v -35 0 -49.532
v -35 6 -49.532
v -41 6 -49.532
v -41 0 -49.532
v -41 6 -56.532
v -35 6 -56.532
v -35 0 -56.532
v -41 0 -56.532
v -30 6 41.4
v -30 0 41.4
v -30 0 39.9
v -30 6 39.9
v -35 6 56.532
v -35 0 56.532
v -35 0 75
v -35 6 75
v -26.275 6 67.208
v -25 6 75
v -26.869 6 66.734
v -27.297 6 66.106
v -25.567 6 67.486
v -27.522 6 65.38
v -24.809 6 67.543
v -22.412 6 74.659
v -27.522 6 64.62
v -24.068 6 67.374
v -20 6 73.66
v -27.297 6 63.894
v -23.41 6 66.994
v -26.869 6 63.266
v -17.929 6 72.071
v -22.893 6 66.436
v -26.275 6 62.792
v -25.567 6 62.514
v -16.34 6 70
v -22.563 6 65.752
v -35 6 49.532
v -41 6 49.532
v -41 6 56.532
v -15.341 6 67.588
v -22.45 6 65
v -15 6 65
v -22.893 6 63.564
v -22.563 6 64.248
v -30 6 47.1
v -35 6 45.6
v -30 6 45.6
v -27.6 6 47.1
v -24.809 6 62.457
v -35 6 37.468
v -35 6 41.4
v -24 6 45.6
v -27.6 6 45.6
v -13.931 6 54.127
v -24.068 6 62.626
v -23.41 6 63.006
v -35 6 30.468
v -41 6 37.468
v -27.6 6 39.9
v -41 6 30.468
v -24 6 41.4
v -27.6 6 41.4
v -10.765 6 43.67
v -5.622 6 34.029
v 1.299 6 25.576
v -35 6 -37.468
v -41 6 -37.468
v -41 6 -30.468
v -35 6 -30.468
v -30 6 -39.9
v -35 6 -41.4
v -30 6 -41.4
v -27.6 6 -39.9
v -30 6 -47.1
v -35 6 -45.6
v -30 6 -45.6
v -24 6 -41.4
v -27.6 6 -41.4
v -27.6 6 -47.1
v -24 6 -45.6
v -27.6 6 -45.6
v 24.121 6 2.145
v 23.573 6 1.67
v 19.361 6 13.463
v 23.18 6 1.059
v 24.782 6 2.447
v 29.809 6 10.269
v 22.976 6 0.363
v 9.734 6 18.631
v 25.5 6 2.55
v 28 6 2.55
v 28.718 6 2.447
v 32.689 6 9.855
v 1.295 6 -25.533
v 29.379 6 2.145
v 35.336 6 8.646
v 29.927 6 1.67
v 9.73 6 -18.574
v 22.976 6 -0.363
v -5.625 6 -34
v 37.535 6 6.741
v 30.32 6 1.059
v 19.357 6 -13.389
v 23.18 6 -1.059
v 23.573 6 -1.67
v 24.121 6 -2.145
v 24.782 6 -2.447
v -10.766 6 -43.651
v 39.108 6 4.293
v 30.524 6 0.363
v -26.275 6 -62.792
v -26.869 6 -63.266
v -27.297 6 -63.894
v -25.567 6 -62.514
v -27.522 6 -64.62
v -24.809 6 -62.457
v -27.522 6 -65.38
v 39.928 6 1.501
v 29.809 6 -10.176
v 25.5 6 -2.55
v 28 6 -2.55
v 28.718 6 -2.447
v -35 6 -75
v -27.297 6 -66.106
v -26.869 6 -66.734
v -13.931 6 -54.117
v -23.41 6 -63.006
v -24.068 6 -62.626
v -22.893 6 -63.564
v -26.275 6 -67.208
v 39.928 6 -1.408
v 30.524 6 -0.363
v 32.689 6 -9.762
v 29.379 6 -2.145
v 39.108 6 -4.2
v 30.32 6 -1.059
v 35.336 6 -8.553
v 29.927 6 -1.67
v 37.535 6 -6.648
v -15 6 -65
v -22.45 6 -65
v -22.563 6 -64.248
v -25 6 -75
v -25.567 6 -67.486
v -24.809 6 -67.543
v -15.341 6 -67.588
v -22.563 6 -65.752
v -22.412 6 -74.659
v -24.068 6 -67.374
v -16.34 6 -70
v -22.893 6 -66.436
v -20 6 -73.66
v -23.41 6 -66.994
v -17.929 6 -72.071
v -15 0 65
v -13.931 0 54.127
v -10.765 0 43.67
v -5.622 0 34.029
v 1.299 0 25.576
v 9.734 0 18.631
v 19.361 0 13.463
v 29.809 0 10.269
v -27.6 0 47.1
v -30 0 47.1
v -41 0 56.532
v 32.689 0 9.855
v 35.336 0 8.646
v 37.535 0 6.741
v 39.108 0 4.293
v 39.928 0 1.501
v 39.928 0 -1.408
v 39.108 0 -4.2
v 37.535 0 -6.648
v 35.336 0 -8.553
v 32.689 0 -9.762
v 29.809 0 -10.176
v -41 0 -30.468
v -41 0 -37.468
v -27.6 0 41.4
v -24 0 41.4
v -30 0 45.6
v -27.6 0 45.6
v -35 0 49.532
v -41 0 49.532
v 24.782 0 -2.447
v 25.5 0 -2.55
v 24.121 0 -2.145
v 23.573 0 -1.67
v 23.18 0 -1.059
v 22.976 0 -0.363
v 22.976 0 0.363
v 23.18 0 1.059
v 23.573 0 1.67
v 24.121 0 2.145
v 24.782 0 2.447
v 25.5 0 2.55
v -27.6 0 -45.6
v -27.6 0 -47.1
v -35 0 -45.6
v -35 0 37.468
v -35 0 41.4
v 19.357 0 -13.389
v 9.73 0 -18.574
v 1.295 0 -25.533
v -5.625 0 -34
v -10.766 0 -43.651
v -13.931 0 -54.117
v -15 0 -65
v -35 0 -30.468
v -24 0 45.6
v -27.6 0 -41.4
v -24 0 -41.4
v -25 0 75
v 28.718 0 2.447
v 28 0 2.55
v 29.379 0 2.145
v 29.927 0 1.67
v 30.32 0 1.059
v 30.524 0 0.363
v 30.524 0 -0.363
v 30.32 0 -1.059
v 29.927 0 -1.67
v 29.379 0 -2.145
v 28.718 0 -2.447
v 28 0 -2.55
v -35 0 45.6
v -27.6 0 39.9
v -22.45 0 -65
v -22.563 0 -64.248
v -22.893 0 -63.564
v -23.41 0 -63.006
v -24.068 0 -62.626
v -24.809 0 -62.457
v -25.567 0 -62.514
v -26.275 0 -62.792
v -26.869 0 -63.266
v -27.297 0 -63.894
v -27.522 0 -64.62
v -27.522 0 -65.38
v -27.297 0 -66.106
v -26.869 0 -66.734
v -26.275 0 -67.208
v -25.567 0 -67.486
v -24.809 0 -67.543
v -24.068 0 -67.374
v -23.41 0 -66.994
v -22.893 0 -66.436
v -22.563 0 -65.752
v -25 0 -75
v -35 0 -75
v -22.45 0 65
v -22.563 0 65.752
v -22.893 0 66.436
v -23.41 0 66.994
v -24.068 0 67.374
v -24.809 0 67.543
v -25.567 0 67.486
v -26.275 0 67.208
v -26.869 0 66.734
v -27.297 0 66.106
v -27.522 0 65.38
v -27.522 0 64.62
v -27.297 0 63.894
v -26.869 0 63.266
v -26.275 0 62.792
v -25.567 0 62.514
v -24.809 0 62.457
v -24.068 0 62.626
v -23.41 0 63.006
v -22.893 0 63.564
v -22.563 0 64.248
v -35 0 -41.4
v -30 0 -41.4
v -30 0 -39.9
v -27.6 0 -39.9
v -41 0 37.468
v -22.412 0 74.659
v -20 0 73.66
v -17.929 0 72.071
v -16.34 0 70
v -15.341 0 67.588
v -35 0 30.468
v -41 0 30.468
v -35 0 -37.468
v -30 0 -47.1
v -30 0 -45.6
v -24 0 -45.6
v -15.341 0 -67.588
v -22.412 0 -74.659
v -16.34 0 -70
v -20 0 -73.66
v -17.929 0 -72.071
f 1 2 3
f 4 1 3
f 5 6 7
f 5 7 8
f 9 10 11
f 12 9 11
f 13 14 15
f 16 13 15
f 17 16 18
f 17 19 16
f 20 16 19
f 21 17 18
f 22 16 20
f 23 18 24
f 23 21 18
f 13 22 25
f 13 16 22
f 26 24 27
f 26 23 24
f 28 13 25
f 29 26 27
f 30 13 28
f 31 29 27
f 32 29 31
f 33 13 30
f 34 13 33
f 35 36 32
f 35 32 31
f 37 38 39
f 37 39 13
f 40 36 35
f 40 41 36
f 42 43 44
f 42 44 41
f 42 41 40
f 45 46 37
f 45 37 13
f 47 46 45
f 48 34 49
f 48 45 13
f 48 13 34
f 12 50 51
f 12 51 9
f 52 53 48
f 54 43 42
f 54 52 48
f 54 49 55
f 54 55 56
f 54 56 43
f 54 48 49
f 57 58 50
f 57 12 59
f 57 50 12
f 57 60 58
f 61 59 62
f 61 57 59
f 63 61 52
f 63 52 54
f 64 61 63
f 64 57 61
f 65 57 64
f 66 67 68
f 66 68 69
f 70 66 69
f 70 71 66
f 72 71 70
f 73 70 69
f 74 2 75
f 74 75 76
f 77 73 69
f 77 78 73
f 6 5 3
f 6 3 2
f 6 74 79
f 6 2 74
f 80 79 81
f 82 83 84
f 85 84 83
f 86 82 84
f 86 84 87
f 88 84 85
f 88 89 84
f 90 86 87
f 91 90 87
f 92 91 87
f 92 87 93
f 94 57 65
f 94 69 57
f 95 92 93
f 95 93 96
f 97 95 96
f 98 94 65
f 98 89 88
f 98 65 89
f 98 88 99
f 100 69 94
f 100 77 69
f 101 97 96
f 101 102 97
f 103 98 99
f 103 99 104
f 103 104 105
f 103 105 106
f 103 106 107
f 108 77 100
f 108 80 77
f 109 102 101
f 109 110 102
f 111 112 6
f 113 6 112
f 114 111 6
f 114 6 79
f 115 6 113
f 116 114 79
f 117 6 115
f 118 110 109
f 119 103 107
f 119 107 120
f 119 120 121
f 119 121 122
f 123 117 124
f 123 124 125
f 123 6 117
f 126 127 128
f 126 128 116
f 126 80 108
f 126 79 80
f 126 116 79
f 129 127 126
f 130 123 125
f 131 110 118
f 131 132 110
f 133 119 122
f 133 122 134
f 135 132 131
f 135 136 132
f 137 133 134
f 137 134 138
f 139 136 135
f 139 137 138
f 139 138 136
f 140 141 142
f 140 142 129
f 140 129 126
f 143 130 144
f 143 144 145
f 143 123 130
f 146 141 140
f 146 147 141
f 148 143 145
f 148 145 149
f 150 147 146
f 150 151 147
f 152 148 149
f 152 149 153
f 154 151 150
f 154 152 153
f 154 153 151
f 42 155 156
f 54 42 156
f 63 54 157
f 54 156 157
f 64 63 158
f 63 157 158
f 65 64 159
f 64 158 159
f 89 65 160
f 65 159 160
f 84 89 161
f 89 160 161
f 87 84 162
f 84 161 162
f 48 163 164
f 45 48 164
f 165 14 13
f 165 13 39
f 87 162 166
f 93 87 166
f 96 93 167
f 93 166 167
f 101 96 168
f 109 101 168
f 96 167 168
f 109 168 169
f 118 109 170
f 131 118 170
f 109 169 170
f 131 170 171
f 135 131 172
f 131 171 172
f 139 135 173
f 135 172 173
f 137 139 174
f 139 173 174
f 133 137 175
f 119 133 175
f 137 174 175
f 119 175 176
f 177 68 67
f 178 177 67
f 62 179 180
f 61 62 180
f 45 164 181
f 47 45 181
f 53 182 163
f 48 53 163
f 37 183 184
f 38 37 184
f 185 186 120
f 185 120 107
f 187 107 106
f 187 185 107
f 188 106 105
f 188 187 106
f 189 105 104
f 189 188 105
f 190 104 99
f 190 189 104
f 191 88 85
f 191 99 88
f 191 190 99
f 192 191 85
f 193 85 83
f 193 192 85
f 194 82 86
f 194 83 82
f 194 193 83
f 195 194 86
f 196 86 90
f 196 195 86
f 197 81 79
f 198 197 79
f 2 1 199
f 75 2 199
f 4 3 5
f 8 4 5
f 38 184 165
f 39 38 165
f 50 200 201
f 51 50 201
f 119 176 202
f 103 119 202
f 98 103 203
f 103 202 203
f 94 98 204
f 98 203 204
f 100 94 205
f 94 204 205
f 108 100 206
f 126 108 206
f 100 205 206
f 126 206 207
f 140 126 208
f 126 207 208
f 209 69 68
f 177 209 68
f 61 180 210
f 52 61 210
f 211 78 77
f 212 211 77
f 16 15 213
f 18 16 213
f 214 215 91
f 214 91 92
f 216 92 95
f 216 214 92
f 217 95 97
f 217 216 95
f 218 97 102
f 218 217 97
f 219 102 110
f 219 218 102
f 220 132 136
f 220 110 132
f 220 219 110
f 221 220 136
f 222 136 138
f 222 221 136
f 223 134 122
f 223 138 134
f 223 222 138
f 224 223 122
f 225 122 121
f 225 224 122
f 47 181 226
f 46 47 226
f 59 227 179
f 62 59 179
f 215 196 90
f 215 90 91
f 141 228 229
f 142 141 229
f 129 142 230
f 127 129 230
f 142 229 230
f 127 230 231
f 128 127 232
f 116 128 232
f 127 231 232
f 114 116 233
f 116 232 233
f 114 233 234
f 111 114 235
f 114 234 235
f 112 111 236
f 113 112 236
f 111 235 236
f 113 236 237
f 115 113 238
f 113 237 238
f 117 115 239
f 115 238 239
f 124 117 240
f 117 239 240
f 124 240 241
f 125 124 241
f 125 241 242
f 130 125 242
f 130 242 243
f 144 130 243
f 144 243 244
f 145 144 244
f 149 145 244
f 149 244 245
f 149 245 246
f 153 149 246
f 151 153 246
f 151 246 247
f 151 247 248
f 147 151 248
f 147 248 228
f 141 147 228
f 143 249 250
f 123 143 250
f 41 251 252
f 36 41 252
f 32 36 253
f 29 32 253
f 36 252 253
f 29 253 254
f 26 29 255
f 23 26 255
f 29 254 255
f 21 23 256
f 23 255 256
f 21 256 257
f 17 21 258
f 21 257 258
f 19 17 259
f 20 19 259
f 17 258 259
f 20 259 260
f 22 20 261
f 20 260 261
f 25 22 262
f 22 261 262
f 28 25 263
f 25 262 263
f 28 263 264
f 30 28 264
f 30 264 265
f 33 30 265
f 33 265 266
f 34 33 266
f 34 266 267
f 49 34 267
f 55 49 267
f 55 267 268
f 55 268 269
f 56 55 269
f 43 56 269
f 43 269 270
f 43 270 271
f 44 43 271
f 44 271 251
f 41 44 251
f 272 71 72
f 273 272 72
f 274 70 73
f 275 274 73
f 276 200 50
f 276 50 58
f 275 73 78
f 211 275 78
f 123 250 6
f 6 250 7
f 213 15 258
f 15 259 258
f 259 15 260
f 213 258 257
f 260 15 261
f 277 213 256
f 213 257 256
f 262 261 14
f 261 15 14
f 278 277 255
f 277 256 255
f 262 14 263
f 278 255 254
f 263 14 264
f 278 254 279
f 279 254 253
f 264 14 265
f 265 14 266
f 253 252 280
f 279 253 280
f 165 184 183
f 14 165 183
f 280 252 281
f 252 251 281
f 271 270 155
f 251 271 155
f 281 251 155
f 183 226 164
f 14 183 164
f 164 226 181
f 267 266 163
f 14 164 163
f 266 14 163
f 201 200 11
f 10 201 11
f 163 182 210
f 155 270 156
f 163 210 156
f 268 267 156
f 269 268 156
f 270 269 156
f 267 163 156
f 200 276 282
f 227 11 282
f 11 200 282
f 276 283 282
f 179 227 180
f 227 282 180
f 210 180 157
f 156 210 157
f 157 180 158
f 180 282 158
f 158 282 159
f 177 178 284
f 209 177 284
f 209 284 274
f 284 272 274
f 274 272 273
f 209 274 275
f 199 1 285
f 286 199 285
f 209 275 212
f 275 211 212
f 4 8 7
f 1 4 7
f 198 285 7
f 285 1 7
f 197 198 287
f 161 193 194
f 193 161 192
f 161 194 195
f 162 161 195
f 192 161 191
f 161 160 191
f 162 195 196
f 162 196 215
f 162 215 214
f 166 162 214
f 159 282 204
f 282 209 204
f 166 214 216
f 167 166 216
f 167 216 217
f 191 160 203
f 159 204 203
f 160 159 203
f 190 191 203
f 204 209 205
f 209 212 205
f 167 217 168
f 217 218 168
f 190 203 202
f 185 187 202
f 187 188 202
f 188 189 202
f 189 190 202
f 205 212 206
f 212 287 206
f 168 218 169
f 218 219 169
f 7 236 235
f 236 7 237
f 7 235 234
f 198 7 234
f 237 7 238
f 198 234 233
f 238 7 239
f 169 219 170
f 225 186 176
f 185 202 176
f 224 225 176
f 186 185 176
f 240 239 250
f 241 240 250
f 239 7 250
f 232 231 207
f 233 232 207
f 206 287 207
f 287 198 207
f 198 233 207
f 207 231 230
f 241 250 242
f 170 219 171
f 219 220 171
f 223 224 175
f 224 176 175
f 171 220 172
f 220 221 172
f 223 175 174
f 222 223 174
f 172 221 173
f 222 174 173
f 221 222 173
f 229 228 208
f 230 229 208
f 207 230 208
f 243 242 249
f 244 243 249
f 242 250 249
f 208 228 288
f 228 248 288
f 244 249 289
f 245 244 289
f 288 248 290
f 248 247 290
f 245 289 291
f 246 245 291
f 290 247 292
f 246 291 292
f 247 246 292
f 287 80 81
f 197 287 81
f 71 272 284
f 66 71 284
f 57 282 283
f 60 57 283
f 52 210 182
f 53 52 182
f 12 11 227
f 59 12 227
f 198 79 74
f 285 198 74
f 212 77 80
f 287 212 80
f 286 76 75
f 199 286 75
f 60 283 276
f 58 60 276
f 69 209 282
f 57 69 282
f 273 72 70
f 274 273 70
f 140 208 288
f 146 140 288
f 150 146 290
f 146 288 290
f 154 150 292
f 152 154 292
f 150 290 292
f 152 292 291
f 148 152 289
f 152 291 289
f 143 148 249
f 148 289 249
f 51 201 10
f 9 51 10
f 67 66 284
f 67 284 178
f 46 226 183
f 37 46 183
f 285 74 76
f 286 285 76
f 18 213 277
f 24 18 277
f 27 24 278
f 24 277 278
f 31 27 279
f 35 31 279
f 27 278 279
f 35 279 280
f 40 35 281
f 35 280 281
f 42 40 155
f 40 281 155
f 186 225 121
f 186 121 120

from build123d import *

# Parameters (mm, degrees)
EXTRUDE_1_DEPTH      = 6
SKETCH_2_R           = 2.55
CUT_EXTRUDE_1_DEPTH  = 7
SKETCH_21_W          = 7
SKETCH_21_H          = 6
EXTRUDE_2_DEPTH      = 6
CUT_EXTRUDE_11_DEPTH = 7
SKETCH_22_W          = 7
SKETCH_22_H          = 6
EXTRUDE_21_DEPTH     = 6
SKETCH_24_W          = 7
SKETCH_24_H          = 6
EXTRUDE_23_DEPTH     = 6
CUT_EXTRUDE_14_DEPTH = 7
SKETCH_25_W          = 7
SKETCH_25_H          = 6
EXTRUDE_24_DEPTH     = 6
SKETCH_26_W          = 7
SKETCH_26_H          = 6
EXTRUDE_25_DEPTH     = 6
SKETCH_27_W          = 7
SKETCH_27_H          = 6
EXTRUDE_26_DEPTH     = 6
SKETCH_28_W          = 7
SKETCH_28_H          = 6
EXTRUDE_27_DEPTH     = 6
SKETCH_29_W          = 7
SKETCH_29_H          = 6
EXTRUDE_28_DEPTH     = 6


with BuildPart() as part:
    # Эскиз1 → Бобышка-Вытянуть1 (new body)
    with BuildSketch(Plane(origin=(0, 0, 0), x_dir=(1, 0, 0), z_dir=(0, 1, 0))):
        with BuildLine():
            Line((-35, -65), (-35, -75))
            Line((-35, -75), (-25, -75))
            ThreePointArc((-25, -75), (-17.928932188, -72.071067812), (-15, -65))
            ThreePointArc((-15, -65), (-2.368853025, -29.632779179), (29.809139443, -10.26881824))
            ThreePointArc((29.809139443, -10.26881824), (40.031565804, -0.046391879), (29.809139443, 10.176034483))
            ThreePointArc((29.809139443, 10.176034483), (-2.372594749, 29.596870998), (-15, 65))
            ThreePointArc((-15, 65), (-17.928932188, 72.071067812), (-25, 75))
            Line((-25, 75), (-35, 75))
            Line((-35, 75), (-35, 65))
            Line((-35, 65), (-35, -65))
        make_face()
    extrude(amount=EXTRUDE_1_DEPTH)

    # Эскиз2 → Вырез-Вытянуть1 (cut, through all)
    with BuildSketch(Plane.XZ):
        with Locations((-25, -65)):
            Circle(SKETCH_2_R)
        with Locations((-25, 65)):
            Circle(SKETCH_2_R)
        with BuildLine():
            Line((28, -2.55), (25.5, -2.55))
            ThreePointArc((25.5, -2.55), (22.95, 0), (25.5, 2.55))
            Line((25.5, 2.55), (28, 2.55))
            ThreePointArc((28, 2.55), (30.55, 0), (28, -2.55))
        make_face()
    extrude(amount=-CUT_EXTRUDE_1_DEPTH, mode=Mode.SUBTRACT)

    # Эскиз21 → Бобышка-Вытянуть2 (add)
    with BuildSketch(Plane(origin=(15, 6, -43.5), x_dir=(0, 0, -1), z_dir=(0, 1, 0))):
        with Locations((-9.531849908, 53)):
            Rectangle(SKETCH_21_W, SKETCH_21_H)
        with Locations((9.531849908, 53)):
            Rectangle(SKETCH_21_W, SKETCH_21_H)
    extrude(amount=-EXTRUDE_2_DEPTH)

    # Эскиз31 → Вырез-Вытянуть11 (cut, through all)
    with BuildSketch(Plane(origin=(15, 6, -43.5), x_dir=(0, 0, -1), z_dir=(0, 1, 0))):
        Polygon((-2.1, 45), (-3.6, 45), (-3.6, 42.6), (-2.1, 42.6), (-2.1, 39), (2.1, 39), (2.1, 42.6), (3.6, 42.6), (3.6, 45), (2.1, 45), (2.1, 50), (-2.1, 50), align=None)
    extrude(amount=-CUT_EXTRUDE_11_DEPTH, mode=Mode.SUBTRACT)

    # Эскиз22 → Бобышка-Вытянуть21 (add)
    with BuildSketch(Plane(origin=(15, 0, -43.5), x_dir=(0, 0, 1), z_dir=(0, -1, 0))):
        with Locations((-9.531849908, 53)):
            Rectangle(SKETCH_22_W, SKETCH_22_H)
        with Locations((9.531849908, 53)):
            Rectangle(SKETCH_22_W, SKETCH_22_H)
    extrude(amount=-EXTRUDE_21_DEPTH)

    # Эскиз24 → Бобышка-Вытянуть23 (add)
    with BuildSketch(Plane(origin=(15, 0, 43.5), x_dir=(0, 0, 1), z_dir=(0, -1, 0))):
        with Locations((-9.531849908, 53)):
            Rectangle(SKETCH_24_W, SKETCH_24_H)
        with Locations((9.531849908, 53)):
            Rectangle(SKETCH_24_W, SKETCH_24_H)
    extrude(amount=-EXTRUDE_23_DEPTH)

    # Эскиз34 → Вырез-Вытянуть14 (cut, through all)
    with BuildSketch(Plane(origin=(15, 0, 43.5), x_dir=(0, 0, 1), z_dir=(0, -1, 0))):
        Polygon((-2.1, 45), (-3.6, 45), (-3.6, 42.6), (-2.1, 42.6), (-2.1, 39), (2.1, 39), (2.1, 42.6), (3.6, 42.6), (3.6, 45), (2.1, 45), (2.1, 50), (-2.1, 50), align=None)
    extrude(amount=-CUT_EXTRUDE_14_DEPTH, mode=Mode.SUBTRACT)

    # Эскиз25 → Бобышка-Вытянуть24 (add)
    with BuildSketch(Plane(origin=(15, 6, 43.5), x_dir=(0, 0, -1), z_dir=(0, 1, 0))):
        with Locations((-9.531849908, 53)):
            Rectangle(SKETCH_25_W, SKETCH_25_H)
        with Locations((9.531849908, 53)):
            Rectangle(SKETCH_25_W, SKETCH_25_H)
    extrude(amount=-EXTRUDE_24_DEPTH)

    # Эскиз26 → Бобышка-Вытянуть25 (add)
    with BuildSketch(Plane(origin=(15, 6, -43.5), x_dir=(0, 0, -1), z_dir=(0, 1, 0))):
        with Locations((-9.531849908, 53)):
            Rectangle(SKETCH_26_W, SKETCH_26_H)
        with Locations((9.531849908, 53)):
            Rectangle(SKETCH_26_W, SKETCH_26_H)
    extrude(amount=-EXTRUDE_25_DEPTH)

    # Эскиз27 → Бобышка-Вытянуть26 (add)
    with BuildSketch(Plane(origin=(15, 6, 43.5), x_dir=(0, 0, -1), z_dir=(0, 1, 0))):
        with Locations((-9.531849908, 53)):
            Rectangle(SKETCH_27_W, SKETCH_27_H)
        with Locations((9.531849908, 53)):
            Rectangle(SKETCH_27_W, SKETCH_27_H)
    extrude(amount=-EXTRUDE_26_DEPTH)

    # Эскиз28 → Бобышка-Вытянуть27 (add)
    with BuildSketch(Plane(origin=(15, 0, -43.5), x_dir=(0, 0, 1), z_dir=(0, -1, 0))):
        with Locations((-9.531849908, 53)):
            Rectangle(SKETCH_28_W, SKETCH_28_H)
        with Locations((9.531849908, 53)):
            Rectangle(SKETCH_28_W, SKETCH_28_H)
    extrude(amount=-EXTRUDE_27_DEPTH)

    # Эскиз29 → Бобышка-Вытянуть28 (add)
    with BuildSketch(Plane(origin=(15, 0, 43.5), x_dir=(0, 0, 1), z_dir=(0, -1, 0))):
        with Locations((-9.531849908, 53)):
            Rectangle(SKETCH_29_W, SKETCH_29_H)
        with Locations((9.531849908, 53)):
            Rectangle(SKETCH_29_W, SKETCH_29_H)
    extrude(amount=-EXTRUDE_28_DEPTH)


solid = part.part
